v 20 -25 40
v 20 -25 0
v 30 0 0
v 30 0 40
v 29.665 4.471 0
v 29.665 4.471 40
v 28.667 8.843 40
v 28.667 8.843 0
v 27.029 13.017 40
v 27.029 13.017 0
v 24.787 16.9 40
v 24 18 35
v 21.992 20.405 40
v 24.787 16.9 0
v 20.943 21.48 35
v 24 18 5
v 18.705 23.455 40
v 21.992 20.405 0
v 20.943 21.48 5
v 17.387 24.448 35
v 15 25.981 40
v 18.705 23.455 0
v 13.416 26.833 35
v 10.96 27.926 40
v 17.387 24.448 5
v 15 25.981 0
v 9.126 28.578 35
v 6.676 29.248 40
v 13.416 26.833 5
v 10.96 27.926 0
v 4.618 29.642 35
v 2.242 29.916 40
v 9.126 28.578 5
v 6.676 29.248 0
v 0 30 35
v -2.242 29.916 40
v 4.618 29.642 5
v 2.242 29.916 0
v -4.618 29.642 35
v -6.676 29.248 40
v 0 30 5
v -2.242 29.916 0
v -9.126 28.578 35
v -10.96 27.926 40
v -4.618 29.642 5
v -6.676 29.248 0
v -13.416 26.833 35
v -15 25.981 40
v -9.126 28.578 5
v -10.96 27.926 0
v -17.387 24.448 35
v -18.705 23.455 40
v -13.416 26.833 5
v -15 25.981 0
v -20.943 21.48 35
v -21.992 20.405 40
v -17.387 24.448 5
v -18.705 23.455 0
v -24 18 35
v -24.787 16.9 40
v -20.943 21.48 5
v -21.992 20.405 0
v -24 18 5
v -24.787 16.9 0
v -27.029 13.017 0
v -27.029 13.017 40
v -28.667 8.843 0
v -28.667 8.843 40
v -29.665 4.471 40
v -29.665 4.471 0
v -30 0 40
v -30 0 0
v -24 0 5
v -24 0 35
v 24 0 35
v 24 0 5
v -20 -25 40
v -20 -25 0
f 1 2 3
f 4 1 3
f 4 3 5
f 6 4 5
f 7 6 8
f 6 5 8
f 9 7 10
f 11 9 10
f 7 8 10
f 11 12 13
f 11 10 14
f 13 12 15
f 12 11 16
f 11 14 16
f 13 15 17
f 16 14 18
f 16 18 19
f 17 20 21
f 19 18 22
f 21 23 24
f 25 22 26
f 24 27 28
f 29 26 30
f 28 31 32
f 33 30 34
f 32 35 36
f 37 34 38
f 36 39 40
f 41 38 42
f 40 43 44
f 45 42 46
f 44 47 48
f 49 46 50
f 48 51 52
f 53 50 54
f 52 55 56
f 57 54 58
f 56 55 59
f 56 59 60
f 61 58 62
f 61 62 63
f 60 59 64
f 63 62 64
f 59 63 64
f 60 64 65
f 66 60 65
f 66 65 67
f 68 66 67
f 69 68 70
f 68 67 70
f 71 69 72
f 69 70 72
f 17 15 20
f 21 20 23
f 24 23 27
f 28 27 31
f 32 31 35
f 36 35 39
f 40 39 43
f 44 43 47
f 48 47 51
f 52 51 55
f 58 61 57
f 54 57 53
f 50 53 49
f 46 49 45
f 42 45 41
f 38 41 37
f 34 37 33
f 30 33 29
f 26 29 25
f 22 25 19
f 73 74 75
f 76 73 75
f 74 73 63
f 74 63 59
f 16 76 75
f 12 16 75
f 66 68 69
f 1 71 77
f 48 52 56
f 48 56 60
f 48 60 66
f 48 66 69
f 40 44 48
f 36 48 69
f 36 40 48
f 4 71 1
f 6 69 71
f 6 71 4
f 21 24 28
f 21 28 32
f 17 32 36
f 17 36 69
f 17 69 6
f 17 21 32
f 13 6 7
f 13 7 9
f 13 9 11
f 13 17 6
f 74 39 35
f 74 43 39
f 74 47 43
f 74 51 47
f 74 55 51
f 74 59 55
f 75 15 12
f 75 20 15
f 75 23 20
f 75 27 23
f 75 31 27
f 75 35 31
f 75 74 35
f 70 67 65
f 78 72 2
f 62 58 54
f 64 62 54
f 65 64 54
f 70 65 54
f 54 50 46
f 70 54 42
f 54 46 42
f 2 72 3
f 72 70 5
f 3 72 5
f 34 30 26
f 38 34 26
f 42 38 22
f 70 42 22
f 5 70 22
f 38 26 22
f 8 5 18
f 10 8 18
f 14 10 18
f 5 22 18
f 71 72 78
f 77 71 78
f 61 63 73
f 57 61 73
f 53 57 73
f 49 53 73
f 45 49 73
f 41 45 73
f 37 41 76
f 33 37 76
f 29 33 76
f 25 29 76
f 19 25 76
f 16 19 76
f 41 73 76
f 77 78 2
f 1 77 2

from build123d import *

# Parameters (mm, degrees)
PAD_DEPTH    = 40
SKETCH001_W  = 48
SKETCH001_H  = 30
POCKET_DEPTH = 30


with BuildPart() as part:
    # Sketch → Pad (new body)
    with BuildSketch(Plane.XY):
        with BuildLine():
            ThreePointArc((30, 0), (0, 30), (-30, 0))
            Line((-30, 0), (-20, -25))
            Line((-20, -25), (20, -25))
            Line((20, -25), (30, 0))
        make_face()
    extrude(amount=PAD_DEPTH)

    # Sketch001 → Pocket (cut)
    with BuildSketch(Plane.XZ):
        with Locations((0, 20)):
            Rectangle(SKETCH001_W, SKETCH001_H)
    extrude(amount=-POCKET_DEPTH, mode=Mode.SUBTRACT)


solid = part.part
